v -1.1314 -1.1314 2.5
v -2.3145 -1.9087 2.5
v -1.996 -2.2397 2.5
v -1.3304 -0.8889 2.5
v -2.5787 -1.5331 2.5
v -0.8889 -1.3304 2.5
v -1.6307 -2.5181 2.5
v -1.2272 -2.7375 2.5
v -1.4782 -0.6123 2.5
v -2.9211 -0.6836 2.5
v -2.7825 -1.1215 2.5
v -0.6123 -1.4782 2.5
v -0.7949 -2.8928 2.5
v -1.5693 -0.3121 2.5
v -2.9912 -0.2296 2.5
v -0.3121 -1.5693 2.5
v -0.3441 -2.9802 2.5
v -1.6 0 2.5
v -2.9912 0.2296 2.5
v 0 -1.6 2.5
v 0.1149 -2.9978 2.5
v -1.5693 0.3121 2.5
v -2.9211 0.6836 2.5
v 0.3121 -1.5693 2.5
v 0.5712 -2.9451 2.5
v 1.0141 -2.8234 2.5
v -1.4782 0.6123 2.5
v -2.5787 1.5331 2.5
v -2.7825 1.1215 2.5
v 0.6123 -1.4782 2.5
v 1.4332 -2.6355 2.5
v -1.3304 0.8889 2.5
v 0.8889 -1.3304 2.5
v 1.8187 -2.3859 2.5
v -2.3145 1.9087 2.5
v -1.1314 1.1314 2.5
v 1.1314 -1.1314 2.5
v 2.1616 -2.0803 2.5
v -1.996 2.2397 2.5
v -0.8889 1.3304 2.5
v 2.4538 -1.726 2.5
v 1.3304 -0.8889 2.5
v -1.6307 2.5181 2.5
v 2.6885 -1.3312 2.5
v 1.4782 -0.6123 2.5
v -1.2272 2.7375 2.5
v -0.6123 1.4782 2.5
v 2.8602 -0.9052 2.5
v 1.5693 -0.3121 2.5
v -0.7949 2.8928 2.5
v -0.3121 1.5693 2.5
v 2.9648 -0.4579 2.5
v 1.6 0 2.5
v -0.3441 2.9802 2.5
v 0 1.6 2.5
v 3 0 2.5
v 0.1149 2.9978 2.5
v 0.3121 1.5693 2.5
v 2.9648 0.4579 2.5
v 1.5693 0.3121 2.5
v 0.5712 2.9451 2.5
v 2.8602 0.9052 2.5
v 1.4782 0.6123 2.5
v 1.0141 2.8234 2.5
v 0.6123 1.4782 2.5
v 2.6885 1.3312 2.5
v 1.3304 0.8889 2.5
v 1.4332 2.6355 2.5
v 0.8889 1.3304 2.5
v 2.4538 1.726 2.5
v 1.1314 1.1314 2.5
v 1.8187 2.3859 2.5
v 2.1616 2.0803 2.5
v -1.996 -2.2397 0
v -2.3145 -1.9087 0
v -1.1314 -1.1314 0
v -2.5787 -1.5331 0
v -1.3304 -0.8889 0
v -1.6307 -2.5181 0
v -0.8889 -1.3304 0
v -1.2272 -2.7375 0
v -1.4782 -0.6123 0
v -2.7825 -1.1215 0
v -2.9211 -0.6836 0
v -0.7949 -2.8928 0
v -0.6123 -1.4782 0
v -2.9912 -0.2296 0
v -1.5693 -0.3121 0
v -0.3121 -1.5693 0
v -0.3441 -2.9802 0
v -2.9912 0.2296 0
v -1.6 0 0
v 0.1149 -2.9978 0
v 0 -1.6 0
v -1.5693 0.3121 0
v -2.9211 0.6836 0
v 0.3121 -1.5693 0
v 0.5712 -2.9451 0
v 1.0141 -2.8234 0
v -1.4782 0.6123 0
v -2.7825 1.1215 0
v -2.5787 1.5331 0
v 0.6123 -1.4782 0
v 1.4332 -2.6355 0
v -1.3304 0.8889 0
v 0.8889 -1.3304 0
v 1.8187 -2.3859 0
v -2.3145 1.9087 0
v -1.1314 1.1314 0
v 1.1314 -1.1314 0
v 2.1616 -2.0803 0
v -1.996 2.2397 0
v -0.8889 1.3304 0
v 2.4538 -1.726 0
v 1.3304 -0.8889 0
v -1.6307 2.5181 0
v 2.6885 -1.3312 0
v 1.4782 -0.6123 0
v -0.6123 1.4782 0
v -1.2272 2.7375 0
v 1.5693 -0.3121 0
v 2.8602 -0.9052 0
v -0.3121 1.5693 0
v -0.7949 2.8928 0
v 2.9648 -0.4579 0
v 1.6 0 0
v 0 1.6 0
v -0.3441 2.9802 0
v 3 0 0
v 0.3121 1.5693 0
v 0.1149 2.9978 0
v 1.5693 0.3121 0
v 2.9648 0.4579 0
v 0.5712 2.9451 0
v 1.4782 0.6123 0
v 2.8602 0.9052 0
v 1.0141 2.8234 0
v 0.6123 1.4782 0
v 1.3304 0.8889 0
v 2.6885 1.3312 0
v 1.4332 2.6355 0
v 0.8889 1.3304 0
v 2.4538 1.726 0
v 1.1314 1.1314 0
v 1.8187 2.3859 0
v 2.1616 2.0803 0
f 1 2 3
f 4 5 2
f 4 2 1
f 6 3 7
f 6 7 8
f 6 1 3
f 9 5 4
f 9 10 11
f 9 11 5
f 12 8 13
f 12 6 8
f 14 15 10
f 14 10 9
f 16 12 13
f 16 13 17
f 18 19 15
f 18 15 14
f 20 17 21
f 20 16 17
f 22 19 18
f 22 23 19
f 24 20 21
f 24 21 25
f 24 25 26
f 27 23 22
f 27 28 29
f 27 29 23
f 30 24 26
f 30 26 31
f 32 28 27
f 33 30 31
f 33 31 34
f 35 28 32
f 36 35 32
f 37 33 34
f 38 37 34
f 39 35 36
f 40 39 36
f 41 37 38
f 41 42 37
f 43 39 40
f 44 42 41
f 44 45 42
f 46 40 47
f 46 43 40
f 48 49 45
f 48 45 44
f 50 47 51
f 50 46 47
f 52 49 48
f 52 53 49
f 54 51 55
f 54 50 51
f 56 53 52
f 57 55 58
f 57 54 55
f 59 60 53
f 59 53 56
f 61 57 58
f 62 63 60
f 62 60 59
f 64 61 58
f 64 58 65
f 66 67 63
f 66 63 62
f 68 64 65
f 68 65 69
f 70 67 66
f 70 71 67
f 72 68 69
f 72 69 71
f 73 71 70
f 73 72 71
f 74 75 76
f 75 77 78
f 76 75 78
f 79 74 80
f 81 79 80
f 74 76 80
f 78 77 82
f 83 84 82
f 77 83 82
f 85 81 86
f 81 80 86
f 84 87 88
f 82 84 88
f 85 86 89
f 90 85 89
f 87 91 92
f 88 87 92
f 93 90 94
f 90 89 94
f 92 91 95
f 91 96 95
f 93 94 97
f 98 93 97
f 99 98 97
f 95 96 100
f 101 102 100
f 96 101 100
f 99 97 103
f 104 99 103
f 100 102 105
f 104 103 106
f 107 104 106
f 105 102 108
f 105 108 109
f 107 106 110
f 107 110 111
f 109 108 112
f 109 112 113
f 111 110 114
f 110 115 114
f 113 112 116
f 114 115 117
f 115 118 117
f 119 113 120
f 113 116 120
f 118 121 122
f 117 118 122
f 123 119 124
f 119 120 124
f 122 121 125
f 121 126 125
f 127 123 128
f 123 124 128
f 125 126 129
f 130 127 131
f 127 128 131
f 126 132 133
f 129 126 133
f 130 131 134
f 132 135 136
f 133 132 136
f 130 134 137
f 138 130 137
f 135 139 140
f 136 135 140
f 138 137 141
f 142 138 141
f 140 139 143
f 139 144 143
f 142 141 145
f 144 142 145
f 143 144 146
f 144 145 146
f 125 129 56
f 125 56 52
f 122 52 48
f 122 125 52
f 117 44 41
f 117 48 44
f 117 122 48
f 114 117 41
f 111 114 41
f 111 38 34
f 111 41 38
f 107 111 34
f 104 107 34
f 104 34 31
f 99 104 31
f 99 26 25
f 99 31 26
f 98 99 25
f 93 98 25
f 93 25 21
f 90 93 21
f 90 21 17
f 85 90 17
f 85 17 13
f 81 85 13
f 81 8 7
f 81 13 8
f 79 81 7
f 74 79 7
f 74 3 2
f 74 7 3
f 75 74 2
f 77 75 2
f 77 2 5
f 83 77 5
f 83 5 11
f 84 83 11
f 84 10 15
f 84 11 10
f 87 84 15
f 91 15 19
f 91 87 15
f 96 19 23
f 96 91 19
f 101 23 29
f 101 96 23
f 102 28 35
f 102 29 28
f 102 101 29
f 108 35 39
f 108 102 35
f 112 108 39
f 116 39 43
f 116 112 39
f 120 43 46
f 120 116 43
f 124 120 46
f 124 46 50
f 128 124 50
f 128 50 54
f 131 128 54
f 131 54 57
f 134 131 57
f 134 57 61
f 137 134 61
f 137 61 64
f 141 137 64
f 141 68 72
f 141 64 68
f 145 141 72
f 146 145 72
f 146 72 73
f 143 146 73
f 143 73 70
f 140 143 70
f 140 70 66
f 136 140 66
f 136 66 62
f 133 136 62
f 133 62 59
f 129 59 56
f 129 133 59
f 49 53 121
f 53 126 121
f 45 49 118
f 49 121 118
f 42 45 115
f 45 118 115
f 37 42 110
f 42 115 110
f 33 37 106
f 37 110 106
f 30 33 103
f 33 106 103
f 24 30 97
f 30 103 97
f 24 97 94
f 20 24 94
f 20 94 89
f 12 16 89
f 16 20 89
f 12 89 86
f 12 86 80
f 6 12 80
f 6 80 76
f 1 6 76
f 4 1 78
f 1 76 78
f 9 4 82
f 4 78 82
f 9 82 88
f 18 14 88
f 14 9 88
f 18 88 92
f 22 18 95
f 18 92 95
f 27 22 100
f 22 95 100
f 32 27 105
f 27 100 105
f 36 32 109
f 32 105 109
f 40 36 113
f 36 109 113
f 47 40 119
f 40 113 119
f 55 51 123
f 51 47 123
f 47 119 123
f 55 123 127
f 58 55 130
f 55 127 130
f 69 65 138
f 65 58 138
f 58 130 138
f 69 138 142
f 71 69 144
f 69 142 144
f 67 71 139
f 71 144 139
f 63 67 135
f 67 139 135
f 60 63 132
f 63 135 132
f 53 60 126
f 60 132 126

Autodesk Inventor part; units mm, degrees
ref_plane "YZ Plane" through (0, 0, 0) normal (1, 0, 0) x (0, 1, 0)
ref_plane "XZ Plane" through (0, 0, 0) normal (0, 1, 0) x (-1, 0, 0)
sketch "スケッチ1" plane through (0, 0, 0) normal (0, 0, 1) x (1, 0, 0)
  circle A0 centre (0, 0) radius 1.6
  circle A1 centre (0, 0) radius 3
  dimension "d0" = 3.2
  dimension "d1" = 6
extrude "押し出し1" add sketch "スケッチ1" along normal blind 2.5
sketch "スケッチ2" plane through (0, 0, 0) normal (1, 0, 0) x (0, 1, 0)
  arc A0 (2.85, 3.5) -> (-2.85, 3.5) centre (0, -0.0613) ccw
  line L0 (2.85, 3.5) -> (-2.85, 3.5)
  line L1 (-2.85, 3.5) -> (-2.85, 2.5)
  line L2 (-2.85, 2.5) -> (2.85, 2.5)
  line L3 (2.85, 2.5) -> (2.85, 3.5)
  line L4 (3, 2.5) -> (-3, 2.5) projected
  line L5 (10, 4.5) -> (-10, 4.5)
  line L6 (0, 2.5) -> (0, 4.5)
  point P0 (0, 0)
  point P1 (0, 4.5)
  dimension "d4" = 1
  dimension "d5" = 1
  dimension "d7" = 5.7
revolve "回転1" add sketch "スケッチ2" angle 360 about axis through (0, 0, 2.5) along (0, 0, 1) picked at (1.6112, 3.682) contours L0 L6 A0 | L3 L2 L6 L0
ref_plane "作業平面1" through (0, 0, 4.5) normal (0, 0, 1) x (1, 0, 0)
sketch "スケッチ3" plane through (0, 0, 4.5) normal (0, 0, 1) x (1, 0, 0)
  line L0 (2.25, -0.5) -> (-2.25, -0.5)
  line L1 (-2.25, -0.5) -> (-2.25, 0.5)
  line L2 (-2.25, 0.5) -> (2.25, 0.5)
  line L3 (2.25, 0.5) -> (2.25, -0.5)
  line L4 (2.25, -0.5) -> (-2.25, 0.5) construction
  line L5 (-2.25, -0.5) -> (2.25, 0.5) construction
  line L6 (-0.5, -2.25) -> (0.5, -2.25)
  line L7 (0.5, -2.25) -> (0.5, 2.25)
  line L8 (0.5, 2.25) -> (-0.5, 2.25)
  line L9 (-0.5, 2.25) -> (-0.5, -2.25)
  line L10 (-0.5, -2.25) -> (0.5, 2.25) construction
  line L11 (0.5, -2.25) -> (-0.5, 2.25) construction
  point P0 (0, 0)
  point P1 (-0.5, 0.5)
  point P2 (-0.5, -0.5)
  point P3 (0.5, -0.5)
  point P4 (0.5, 0.5)
  dimension "d9" = 4.5
  dimension "d10" = 1
extrude "押し出し2" cut sketch "スケッチ3" against normal blind 1
sketch "スケッチ5" plane through (0, 0, 2.5) normal (0, 0, 1) x (1, 0, 0)
  circle A0 centre (0, 0) radius 3 projected
extrude "押し出し4" cut sketch "スケッチ5" along normal through all
properties part number "bearing_3_6_2.5_noscrew" material "アルミニウム 6061"
